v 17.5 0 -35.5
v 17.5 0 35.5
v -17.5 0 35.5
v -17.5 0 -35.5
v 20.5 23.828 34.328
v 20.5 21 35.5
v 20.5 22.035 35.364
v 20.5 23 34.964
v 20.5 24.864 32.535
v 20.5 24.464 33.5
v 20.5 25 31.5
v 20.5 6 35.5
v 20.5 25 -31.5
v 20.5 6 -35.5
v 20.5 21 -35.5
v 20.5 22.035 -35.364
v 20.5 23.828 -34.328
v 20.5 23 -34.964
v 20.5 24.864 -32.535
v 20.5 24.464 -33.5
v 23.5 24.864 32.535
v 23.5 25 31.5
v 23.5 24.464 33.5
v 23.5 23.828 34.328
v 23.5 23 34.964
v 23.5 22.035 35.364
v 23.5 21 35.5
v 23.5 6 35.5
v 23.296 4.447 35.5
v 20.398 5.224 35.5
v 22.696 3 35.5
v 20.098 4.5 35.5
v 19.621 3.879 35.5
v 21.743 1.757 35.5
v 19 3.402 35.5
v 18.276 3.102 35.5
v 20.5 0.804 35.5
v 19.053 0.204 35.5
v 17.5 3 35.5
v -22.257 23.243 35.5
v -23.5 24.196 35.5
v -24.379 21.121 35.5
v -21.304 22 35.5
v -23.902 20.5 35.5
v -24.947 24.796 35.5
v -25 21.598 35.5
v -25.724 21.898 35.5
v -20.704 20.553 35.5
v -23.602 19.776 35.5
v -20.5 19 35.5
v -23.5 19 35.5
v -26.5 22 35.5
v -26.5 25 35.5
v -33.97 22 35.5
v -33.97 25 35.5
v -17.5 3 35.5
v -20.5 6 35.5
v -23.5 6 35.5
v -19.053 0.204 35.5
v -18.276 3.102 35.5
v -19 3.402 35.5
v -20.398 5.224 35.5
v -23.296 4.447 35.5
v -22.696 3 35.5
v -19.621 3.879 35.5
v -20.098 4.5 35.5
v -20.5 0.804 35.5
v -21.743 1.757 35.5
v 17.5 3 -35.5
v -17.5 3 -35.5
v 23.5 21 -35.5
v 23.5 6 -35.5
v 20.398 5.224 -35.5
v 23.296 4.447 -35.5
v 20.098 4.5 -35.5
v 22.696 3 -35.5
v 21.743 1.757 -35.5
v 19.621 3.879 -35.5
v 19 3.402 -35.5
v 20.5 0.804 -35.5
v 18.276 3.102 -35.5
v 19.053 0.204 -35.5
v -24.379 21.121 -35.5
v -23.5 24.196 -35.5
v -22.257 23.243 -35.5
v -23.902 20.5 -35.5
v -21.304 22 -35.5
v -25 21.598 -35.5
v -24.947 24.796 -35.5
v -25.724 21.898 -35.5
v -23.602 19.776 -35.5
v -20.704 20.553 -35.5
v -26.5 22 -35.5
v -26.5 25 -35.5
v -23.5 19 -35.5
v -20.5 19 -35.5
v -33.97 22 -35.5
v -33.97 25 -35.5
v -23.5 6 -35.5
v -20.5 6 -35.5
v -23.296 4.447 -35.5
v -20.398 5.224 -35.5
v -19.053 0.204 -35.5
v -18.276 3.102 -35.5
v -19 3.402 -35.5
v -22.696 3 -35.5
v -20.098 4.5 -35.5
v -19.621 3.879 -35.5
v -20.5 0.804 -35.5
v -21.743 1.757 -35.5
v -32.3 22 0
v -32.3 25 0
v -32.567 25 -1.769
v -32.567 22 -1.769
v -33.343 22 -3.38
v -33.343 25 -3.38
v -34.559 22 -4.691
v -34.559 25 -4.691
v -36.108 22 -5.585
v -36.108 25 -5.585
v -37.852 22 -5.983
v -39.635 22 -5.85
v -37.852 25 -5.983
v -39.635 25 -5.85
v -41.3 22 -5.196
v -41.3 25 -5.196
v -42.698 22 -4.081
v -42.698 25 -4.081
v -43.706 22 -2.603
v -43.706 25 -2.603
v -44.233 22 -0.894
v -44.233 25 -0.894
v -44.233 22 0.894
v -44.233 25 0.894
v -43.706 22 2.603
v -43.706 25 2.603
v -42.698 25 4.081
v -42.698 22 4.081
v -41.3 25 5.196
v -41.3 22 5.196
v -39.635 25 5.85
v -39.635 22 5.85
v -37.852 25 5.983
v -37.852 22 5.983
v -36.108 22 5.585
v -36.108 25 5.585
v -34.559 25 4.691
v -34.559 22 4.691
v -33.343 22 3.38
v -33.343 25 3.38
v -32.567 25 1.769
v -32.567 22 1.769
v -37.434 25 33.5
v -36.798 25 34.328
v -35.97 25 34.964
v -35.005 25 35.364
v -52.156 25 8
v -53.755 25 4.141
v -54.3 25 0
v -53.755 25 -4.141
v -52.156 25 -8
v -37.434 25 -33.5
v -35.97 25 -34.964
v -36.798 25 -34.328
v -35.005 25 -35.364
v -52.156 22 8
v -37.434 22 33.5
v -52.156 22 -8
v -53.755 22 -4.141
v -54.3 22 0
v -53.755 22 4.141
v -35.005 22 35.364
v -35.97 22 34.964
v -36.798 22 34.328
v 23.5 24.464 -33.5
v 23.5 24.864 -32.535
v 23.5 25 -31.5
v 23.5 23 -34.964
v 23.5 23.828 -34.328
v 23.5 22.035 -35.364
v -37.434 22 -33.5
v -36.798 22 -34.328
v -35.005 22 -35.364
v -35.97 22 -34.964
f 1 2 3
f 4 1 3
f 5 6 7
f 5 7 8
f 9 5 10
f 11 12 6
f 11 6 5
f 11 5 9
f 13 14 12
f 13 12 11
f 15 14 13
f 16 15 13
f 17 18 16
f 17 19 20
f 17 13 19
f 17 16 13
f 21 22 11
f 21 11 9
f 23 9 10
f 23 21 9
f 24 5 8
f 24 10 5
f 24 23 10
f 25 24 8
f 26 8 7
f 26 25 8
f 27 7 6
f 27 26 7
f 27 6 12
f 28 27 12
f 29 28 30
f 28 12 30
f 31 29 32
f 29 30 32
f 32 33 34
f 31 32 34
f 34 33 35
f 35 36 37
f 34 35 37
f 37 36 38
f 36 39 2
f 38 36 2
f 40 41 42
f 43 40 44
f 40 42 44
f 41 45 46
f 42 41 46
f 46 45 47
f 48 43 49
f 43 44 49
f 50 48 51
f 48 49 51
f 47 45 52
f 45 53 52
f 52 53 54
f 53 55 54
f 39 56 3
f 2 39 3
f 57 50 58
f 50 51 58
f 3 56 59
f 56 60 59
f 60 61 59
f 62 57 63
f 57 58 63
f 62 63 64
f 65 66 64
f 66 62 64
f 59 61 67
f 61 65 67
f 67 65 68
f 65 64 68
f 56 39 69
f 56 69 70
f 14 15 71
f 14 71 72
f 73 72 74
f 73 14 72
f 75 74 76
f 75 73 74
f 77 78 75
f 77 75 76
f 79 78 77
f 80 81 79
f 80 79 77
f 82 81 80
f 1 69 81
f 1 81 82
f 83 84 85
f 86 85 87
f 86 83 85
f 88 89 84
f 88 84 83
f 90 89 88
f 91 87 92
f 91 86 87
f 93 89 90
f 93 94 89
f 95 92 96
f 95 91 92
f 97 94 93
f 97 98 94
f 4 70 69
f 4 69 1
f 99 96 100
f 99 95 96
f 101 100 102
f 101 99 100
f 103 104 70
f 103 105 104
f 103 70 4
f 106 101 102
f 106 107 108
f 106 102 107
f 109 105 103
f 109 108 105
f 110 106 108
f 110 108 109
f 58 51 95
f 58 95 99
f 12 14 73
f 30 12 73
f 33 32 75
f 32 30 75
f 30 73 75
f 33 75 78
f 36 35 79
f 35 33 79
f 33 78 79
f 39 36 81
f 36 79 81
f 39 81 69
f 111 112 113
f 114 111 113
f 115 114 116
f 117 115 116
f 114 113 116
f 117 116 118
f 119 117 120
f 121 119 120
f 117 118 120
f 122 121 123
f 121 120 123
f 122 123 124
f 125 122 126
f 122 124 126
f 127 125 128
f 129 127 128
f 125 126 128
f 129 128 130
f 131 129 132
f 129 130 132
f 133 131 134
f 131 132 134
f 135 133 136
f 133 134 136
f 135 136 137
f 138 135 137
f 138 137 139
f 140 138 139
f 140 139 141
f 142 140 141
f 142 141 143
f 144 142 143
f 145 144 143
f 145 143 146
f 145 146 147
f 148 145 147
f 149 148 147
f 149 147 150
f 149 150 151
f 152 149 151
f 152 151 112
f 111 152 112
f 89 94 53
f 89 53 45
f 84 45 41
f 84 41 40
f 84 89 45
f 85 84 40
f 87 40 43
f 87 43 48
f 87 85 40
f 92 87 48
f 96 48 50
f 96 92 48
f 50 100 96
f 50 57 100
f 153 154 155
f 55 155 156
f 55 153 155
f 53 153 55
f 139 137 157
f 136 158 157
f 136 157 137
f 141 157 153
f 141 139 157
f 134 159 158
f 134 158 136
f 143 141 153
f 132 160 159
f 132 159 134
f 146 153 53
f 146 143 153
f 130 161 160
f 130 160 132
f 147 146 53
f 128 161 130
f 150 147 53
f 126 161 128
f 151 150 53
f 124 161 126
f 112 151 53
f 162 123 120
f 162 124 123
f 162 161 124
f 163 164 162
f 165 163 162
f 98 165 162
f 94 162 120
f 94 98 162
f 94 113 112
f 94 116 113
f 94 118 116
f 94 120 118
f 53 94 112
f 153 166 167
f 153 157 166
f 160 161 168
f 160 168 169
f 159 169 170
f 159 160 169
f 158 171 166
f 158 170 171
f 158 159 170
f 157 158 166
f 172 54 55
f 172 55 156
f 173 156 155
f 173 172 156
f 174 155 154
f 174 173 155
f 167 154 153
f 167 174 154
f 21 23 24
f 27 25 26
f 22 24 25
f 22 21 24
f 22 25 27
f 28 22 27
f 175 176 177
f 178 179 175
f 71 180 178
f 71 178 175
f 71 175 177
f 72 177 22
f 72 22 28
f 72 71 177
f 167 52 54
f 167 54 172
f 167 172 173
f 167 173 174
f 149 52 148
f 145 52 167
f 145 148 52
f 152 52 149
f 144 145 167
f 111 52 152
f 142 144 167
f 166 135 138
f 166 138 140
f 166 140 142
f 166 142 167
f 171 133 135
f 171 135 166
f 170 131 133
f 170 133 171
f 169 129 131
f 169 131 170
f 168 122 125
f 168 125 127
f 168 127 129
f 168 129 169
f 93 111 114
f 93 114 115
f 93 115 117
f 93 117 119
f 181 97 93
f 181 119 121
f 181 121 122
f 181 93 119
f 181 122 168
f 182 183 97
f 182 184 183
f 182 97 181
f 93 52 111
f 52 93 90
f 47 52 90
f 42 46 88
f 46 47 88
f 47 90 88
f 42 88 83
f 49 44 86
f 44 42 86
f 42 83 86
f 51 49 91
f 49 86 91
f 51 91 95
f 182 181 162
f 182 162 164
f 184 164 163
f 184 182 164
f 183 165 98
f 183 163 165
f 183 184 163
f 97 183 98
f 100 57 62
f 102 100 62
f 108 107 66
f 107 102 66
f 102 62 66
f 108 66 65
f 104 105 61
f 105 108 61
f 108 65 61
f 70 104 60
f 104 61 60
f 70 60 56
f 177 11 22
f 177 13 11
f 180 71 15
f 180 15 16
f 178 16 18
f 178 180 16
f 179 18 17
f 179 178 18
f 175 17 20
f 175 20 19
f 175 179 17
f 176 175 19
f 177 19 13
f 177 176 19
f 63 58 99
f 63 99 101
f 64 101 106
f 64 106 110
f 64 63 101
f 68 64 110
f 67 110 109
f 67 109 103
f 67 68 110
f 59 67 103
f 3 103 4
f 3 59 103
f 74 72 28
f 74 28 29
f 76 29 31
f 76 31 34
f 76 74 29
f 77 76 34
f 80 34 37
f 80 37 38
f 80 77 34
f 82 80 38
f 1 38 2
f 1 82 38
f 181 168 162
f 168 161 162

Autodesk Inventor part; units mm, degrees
ref_plane "YZ Plane" through (0, 0, 0) normal (1, 0, 0) x (0, 1, 0)
ref_plane "XZ Plane" through (0, 0, 0) normal (0, 1, 0) x (-1, 0, 0)
ref_plane "XY Plane" through (0, 0, 0) normal (0, 0, 1) x (1, 0, 0)
sketch "Sketch1" plane through (0, 0, 0) normal (0, 1, 0) x (-1, 0, 0)
  line L0 (-20.5, 35.5) -> (20.5, 35.5)
  line L1 (20.5, 35.5) -> (20.5, -35.5)
  line L2 (20.5, -35.5) -> (-20.5, -35.5)
  line L3 (-20.5, -35.5) -> (-20.5, 35.5)
  line L4 (-20.5, 35.5) -> (20.5, -35.5) construction
  line L5 (20.5, 35.5) -> (-20.5, -35.5) construction
  point P0 (0, 0)
  point P1 (0, 0)
  point P2 (0, 0)
  dimension "d0" = 71
  dimension "d1" = 41
extrude "Plate1" add sketch "Sketch1" along normal blind 3
sketch "Sketch2" plane through (20.5, 3, -35.5) normal (1, 0, 0) x (0, 1, 0)
  line L0 (0, 71) -> (0, 0)
  line L1 (0, 0) -> (22, 0)
  line L2 (22, 0) -> (22, 71)
  line L3 (22, 71) -> (0, 71)
edge flange "Flange1" height 22 angle 90 thickness 3 bend radius 3 thickness toward (1, 0, 0) relief tear relief width 3 relief depth 1.5 corner gap 3 corner form 0 edges at (20.5, 3, 0) (-20.5, 3, 0) wall of the first edge with corners at (20.5, 3, 35.5) (20.5, 3, -35.5) (20.5, 25, -35.5) (20.5, 25, 35.5)
bend "Bend1"
corner "Corner1"
sketch "Sketch3" plane through (-20.5, 22, -35.5) normal (0, 1, 0) x (-1, 0, 0)
  line L0 (0, 71) -> (0, 0)
  line L1 (0, 0) -> (33.8, 0)
  line L2 (33.8, 0) -> (33.8, 71)
  line L3 (33.8, 71) -> (0, 71)
edge flange "Flange2" height 33.8 angle 90 thickness 3 bend radius 3 thickness toward (0, 1, 0) relief tear relief width 3 relief depth 1.5 edges at (-23.5, 25, 0) wall of the first edge with corners at (-20.5, 22, 35.5) (-20.5, 22, -35.5) (-54.3, 22, -35.5) (-54.3, 22, 35.5)
bend "Bend2"
corner "Corner2"
sketch "Sketch4" plane through (-54.3, 25, 35.5) normal (0, 1, 0) x (1, 0, 0)
  line L0 (0, 0) -> (28.3, 0)
  line L1 (28.3, 71) -> (0, 71)
  line L2 (0, 0) -> (0, 71)
  line L3 (54.3, 35.5) -> (0, 35.5) construction
  line L4 (2.1436, 27.5) -> (18.0207, 0)
  line L5 (2.1436, 43.5) -> (18.0207, 71)
  arc A0 (2.1436, 43.5) -> (2.1436, 27.5) centre (16, 35.5) ccw
  line L6 (74.8, 71) -> (77.8, 71) projected
  line L7 (74.8, 0) -> (77.8, 0) projected
  point P0 (54.3, 35.5)
  dimension "d23" = 30
  dimension "d24" = 30
  dimension "d25" = 16
  dimension "d26" = 38.3
extrude "Cut1" cut sketch "Sketch4" against normal blind 3
fillet "Fillet1" radius 4 4 edges at (-36.2793, 23.5, 35.5) (-36.2793, 23.5, -35.5) (22, 25, -35.5) (22, 25, 35.5)
sketch "Sketch5" plane through (-26.5, 25, 35.5) normal (0, 1, 0) x (1, 0, 0)
  arc A0 (-25.6564, 43.5) -> (-25.6564, 27.5) centre (-11.8, 35.5) ccw projected
  circle A1 centre (-11.8, 35.5) radius 6
  point P0 (26.5, 35.5)
  dimension "d30" = 12
extrude "Extrusion1" cut sketch "Sketch5" against normal through all
equation "\"d24\" = d23"
equation "\"d27\" = Thickness"
equation "\"d2\" = Thickness"
equation "\"d3\" = BendReliefWidth"
equation "\"d4\" = BendReliefDepth"
equation "\"d5\" = MinimumRemnant"
equation "\"d6\" = TransitionRadius"
equation "\"d9\" = BendRadius"
equation "\"d10\" = CornerReliefSize"
equation "\"d11\" = GapSize"
equation "\"d12\" = JacobiRadiusSize"
equation "\"d13\" = BendReliefWidth"
equation "\"d14\" = BendReliefDepth"
equation "\"d15\" = MinimumRemnant"
equation "\"d16\" = TransitionRadius"
equation "\"d19\" = BendRadius"
equation "\"d20\" = CornerReliefSize"
equation "\"d21\" = GapSize"
equation "\"d22\" = JacobiRadiusSize"
equation "\"BendRadius\" = Thickness"
equation "\"BendReliefWidth\" = Thickness"
equation "\"BendReliefDepth\" = 0.5 * Thickness"
equation "\"CornerReliefSize\" = 4 * Thickness"
equation "\"MinimumRemnant\" = 2 * Thickness"
equation "\"TransitionRadius\" = BendRadius"
equation "\"JacobiRadiusSize\" = BendRadius"
equation "\"GapSize\" = Thickness"
equation "\"Thickness\" = 3"
properties part number "318-02" material "Aluminum 6061"
